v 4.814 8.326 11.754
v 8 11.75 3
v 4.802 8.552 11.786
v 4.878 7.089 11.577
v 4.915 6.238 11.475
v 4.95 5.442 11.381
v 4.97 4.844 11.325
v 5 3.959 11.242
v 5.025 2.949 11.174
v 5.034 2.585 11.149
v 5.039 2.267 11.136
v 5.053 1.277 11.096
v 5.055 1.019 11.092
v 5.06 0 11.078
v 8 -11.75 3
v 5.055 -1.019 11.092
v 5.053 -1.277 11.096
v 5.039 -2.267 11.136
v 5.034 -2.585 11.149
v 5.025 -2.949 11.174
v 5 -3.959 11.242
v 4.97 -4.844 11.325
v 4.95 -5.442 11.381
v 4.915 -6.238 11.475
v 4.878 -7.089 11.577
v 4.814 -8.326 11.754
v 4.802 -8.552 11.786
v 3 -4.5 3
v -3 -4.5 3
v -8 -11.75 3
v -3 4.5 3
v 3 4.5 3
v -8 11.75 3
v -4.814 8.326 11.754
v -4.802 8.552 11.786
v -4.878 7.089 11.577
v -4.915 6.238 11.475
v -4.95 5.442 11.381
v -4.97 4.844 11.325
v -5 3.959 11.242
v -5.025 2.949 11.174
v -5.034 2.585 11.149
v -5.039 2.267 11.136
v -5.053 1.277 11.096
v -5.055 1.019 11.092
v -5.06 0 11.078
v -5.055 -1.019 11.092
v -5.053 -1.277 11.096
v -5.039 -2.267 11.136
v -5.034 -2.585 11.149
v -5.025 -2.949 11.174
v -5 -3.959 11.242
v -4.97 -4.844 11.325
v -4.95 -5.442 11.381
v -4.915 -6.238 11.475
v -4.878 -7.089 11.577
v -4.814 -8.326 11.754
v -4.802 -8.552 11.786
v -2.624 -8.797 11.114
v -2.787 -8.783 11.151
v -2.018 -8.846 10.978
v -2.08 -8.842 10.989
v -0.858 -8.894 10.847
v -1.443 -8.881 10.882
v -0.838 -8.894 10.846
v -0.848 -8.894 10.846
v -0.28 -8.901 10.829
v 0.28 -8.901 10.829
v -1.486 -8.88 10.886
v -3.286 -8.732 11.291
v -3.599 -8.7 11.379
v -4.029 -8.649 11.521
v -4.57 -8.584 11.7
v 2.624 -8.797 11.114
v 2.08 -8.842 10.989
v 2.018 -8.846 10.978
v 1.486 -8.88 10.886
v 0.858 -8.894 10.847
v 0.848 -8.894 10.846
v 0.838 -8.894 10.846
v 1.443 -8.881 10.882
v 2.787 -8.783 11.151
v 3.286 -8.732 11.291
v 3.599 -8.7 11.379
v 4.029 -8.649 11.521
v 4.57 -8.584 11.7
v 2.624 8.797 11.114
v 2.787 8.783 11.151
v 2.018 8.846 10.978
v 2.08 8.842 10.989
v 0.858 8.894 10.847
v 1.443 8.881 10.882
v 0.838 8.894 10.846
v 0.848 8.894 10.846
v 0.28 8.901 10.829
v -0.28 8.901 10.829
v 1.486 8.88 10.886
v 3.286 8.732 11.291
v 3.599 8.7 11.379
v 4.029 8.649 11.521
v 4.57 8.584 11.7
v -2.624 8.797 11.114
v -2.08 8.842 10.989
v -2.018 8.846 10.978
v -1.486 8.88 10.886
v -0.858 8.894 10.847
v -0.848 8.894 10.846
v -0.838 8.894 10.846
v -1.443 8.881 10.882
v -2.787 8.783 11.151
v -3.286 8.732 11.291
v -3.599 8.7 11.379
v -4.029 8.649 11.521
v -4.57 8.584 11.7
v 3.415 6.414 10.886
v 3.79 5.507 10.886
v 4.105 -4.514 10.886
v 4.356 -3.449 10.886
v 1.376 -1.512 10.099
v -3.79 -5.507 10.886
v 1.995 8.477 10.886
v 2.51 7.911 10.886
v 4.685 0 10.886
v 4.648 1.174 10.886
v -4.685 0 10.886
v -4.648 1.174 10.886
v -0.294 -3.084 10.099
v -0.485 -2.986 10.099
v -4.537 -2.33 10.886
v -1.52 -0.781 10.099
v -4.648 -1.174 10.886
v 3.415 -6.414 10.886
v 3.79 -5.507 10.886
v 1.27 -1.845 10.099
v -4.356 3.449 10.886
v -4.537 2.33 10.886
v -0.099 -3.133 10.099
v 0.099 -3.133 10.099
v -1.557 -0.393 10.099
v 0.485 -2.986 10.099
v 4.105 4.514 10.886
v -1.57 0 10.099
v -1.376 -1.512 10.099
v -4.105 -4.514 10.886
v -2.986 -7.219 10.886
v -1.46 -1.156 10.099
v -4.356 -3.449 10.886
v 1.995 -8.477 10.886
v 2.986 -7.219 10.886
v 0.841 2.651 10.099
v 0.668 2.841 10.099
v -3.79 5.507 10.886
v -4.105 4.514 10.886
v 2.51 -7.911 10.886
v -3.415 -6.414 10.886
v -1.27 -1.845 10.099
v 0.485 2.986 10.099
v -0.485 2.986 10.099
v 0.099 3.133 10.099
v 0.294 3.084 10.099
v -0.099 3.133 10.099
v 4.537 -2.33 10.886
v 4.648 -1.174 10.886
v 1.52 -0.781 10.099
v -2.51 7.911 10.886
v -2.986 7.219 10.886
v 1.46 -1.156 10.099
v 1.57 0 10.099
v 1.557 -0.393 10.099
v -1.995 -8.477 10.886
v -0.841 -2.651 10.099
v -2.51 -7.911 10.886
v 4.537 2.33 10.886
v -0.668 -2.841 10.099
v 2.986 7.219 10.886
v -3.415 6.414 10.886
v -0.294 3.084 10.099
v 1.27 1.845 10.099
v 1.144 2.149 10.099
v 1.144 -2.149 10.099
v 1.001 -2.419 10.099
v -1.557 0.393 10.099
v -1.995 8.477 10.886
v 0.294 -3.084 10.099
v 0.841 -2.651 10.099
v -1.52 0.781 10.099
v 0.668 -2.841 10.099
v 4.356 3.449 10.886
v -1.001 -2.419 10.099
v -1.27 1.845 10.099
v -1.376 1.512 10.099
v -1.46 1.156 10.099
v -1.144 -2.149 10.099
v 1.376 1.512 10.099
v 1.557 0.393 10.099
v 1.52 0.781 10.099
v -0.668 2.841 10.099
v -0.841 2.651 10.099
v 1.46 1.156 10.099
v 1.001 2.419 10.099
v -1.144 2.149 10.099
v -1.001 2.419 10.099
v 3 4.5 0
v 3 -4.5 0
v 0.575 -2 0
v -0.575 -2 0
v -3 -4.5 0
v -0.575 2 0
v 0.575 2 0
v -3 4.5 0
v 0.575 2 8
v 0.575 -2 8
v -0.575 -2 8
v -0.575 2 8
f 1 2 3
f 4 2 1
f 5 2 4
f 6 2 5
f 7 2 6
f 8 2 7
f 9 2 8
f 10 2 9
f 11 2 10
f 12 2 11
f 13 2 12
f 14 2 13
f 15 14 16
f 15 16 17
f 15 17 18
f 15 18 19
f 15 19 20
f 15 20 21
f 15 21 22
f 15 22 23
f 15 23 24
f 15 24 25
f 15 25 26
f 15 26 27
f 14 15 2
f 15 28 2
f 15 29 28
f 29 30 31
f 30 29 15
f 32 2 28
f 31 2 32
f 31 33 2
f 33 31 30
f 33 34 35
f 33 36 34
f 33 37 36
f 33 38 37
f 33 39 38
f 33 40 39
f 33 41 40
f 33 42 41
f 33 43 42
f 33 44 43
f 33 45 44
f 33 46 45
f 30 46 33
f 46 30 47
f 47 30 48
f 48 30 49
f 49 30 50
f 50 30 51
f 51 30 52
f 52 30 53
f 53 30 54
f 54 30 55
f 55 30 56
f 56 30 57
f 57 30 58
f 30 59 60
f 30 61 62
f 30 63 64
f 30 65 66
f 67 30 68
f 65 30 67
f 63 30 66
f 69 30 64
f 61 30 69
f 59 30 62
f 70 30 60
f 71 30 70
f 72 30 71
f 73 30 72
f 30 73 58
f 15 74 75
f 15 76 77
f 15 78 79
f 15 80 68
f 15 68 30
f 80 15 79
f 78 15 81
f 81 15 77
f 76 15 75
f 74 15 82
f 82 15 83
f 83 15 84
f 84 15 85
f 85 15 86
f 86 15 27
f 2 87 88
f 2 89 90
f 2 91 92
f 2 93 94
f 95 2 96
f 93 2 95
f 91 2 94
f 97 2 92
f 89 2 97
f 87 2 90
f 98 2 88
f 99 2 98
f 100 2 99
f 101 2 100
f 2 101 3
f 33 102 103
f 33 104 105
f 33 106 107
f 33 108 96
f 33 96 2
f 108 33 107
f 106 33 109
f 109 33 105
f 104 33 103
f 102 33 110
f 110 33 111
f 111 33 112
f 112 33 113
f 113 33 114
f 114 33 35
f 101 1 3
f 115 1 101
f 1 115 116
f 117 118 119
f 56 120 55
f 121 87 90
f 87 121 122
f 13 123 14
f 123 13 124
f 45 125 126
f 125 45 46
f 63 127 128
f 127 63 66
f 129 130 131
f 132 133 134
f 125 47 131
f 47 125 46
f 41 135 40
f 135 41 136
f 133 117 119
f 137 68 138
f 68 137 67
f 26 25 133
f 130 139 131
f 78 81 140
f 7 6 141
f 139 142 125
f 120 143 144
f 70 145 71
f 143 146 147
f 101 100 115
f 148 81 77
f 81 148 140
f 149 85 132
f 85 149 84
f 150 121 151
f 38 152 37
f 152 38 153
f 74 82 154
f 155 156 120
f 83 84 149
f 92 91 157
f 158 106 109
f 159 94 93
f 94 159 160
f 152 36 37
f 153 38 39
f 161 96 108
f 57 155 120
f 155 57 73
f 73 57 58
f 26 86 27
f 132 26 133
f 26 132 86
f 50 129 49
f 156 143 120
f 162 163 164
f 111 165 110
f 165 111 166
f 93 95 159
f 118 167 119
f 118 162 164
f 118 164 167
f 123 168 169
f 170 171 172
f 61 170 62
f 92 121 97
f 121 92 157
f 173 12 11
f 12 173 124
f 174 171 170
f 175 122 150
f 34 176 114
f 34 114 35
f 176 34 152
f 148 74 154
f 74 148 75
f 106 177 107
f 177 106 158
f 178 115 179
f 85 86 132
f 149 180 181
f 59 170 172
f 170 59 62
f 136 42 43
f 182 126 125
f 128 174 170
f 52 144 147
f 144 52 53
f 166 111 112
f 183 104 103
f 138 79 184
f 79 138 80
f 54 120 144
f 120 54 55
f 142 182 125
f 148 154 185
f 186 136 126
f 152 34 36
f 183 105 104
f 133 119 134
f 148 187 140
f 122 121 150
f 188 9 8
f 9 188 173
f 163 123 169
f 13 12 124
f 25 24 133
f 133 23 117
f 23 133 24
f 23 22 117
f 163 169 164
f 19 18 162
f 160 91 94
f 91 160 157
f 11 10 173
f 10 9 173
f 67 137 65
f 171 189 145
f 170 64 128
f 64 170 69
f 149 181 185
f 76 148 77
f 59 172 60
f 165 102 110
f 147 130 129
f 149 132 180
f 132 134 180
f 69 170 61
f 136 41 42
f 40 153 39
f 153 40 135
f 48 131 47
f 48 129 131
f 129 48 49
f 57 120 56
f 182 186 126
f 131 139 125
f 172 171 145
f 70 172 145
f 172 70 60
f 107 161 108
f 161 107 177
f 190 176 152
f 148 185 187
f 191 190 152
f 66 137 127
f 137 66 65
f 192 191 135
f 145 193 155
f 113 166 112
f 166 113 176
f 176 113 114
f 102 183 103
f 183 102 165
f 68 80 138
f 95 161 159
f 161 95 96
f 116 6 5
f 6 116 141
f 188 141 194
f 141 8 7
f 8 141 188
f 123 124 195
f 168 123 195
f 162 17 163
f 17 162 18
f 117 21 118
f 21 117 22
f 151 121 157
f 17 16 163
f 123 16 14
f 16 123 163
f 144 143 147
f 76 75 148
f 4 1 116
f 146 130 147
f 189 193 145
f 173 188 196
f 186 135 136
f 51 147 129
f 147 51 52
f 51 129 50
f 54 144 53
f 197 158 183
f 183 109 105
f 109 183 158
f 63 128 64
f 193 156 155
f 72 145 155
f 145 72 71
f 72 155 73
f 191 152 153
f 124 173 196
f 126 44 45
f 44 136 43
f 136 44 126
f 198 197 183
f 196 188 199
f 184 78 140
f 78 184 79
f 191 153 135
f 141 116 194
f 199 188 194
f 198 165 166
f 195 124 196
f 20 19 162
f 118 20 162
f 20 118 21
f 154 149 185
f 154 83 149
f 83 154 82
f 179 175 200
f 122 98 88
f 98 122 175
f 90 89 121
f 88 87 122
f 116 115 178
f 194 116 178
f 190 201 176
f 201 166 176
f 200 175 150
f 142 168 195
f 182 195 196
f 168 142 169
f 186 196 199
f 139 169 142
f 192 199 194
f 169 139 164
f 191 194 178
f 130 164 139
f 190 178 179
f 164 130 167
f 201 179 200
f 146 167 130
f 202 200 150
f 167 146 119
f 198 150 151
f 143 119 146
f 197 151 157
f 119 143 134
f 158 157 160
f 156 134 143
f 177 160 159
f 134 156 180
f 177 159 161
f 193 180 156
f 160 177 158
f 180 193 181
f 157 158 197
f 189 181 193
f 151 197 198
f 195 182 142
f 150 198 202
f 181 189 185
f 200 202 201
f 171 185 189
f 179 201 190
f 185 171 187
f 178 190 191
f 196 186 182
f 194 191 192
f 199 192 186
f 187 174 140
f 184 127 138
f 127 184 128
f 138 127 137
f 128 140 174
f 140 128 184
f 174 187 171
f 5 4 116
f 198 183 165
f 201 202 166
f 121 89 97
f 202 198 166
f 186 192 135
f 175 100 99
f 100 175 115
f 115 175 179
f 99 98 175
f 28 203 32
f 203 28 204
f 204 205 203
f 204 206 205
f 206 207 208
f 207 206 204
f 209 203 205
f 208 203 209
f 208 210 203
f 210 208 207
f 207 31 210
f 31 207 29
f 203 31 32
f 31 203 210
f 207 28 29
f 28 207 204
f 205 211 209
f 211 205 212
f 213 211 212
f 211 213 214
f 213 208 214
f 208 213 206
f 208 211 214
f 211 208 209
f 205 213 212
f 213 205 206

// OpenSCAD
module slider_peg() {
translate([0,0,4]) cube([1.15,4,8],center=true);
}

module dial_peg() {
translate([0,0,5])difference() { cylinder(r=3,h=10,center=true);
for (i=[0:5]) {
rotate(60*i)
translate([3,0,1]) cylinder(r=0.25,h=8,center=true);
}
}
}

module trapezoid(dimensions,slant_x,slant_y) {
translate([0,0,-dimensions[2]/2]) intersection() {
rotate([90,0,0]) 
translate([0,0,-dimensions[1]/2]) linear_extrude(height=dimensions[1])
polygon(points=[[-dimensions[0]/2,0],[dimensions[0]/2,0],[0,tan(90-slant_x)*dimensions[0]/2]]);
rotate([0,-90,0]) 
translate([0,0,-dimensions[0]/2]) linear_extrude(height=dimensions[0])
polygon(points=[[0,-dimensions[1]/2],[0,dimensions[1]/2],[tan(90-slant_y)*dimensions[1]/2,0]]);
translate([0,0,dimensions[2]/2])cube(dimensions,center=true);
}
}

module slider() {
difference() {
union() {
translate([0,0,3]) difference() {
translate([0,0,5]) trapezoid([16,23.5,10],20,20);
scale([0.5,1,1]) translate([0,0,57])sphere(r=50);
translate([7.75,0,0]) rotate([0,-110,0]) trapezoid([20,1,1],90,30);
translate([-7.75,0,0]) rotate([0,110,0]) trapezoid([20,1,1],90,30);
translate([0,0,8]) rotate([0,180,0]) trapezoid([20,2,2],90,30);
}
translate([0,0,1.5])cube([6,9,3],center=true);
}
slider_peg();
}
}

module dial() {
difference() {
union(){
translate([0,0,13/2+3.5])cylinder(r1=14/2,r2=12.5/2,h=13,center=true);
difference() {
translate([0,0,0])scale([1,1,1]) sphere(r=8);
translate([0,0,-100])cube([200,200,200],center=true);
}
}
for (i=[0:15]) {
rotate(360/18.5*(i+1.75))
translate([13/2,0,10])
rotate([0,90+atan(12/0.75),0]) 
cylinder(r=0.25,h=12.5,center=true);
}
translate([3+2.5,0,16])cube([5,0.5,3],center=true);
translate([6.5,0,14])cube([1,0.5,5],center=true);
translate([25,5,13+3.5]) scale([4,0.75,1]) cylinder(r=14/2,h=2,center=true);
translate([0,0,13+3.5])difference() {
cylinder(r=20,h=2,center=true);
cylinder(r=11.5/2,h=3,center=true);
}
translate([25,-5,13+3.5]) scale([4,0.75,1]) cylinder(r=14/2,h=2,center=true);
translate([0,0,31]) rotate([0,3.75,0]) cube([30,30,30],center=true);
dial_peg();
}
}

slider();
//dial();

$fn=50;
